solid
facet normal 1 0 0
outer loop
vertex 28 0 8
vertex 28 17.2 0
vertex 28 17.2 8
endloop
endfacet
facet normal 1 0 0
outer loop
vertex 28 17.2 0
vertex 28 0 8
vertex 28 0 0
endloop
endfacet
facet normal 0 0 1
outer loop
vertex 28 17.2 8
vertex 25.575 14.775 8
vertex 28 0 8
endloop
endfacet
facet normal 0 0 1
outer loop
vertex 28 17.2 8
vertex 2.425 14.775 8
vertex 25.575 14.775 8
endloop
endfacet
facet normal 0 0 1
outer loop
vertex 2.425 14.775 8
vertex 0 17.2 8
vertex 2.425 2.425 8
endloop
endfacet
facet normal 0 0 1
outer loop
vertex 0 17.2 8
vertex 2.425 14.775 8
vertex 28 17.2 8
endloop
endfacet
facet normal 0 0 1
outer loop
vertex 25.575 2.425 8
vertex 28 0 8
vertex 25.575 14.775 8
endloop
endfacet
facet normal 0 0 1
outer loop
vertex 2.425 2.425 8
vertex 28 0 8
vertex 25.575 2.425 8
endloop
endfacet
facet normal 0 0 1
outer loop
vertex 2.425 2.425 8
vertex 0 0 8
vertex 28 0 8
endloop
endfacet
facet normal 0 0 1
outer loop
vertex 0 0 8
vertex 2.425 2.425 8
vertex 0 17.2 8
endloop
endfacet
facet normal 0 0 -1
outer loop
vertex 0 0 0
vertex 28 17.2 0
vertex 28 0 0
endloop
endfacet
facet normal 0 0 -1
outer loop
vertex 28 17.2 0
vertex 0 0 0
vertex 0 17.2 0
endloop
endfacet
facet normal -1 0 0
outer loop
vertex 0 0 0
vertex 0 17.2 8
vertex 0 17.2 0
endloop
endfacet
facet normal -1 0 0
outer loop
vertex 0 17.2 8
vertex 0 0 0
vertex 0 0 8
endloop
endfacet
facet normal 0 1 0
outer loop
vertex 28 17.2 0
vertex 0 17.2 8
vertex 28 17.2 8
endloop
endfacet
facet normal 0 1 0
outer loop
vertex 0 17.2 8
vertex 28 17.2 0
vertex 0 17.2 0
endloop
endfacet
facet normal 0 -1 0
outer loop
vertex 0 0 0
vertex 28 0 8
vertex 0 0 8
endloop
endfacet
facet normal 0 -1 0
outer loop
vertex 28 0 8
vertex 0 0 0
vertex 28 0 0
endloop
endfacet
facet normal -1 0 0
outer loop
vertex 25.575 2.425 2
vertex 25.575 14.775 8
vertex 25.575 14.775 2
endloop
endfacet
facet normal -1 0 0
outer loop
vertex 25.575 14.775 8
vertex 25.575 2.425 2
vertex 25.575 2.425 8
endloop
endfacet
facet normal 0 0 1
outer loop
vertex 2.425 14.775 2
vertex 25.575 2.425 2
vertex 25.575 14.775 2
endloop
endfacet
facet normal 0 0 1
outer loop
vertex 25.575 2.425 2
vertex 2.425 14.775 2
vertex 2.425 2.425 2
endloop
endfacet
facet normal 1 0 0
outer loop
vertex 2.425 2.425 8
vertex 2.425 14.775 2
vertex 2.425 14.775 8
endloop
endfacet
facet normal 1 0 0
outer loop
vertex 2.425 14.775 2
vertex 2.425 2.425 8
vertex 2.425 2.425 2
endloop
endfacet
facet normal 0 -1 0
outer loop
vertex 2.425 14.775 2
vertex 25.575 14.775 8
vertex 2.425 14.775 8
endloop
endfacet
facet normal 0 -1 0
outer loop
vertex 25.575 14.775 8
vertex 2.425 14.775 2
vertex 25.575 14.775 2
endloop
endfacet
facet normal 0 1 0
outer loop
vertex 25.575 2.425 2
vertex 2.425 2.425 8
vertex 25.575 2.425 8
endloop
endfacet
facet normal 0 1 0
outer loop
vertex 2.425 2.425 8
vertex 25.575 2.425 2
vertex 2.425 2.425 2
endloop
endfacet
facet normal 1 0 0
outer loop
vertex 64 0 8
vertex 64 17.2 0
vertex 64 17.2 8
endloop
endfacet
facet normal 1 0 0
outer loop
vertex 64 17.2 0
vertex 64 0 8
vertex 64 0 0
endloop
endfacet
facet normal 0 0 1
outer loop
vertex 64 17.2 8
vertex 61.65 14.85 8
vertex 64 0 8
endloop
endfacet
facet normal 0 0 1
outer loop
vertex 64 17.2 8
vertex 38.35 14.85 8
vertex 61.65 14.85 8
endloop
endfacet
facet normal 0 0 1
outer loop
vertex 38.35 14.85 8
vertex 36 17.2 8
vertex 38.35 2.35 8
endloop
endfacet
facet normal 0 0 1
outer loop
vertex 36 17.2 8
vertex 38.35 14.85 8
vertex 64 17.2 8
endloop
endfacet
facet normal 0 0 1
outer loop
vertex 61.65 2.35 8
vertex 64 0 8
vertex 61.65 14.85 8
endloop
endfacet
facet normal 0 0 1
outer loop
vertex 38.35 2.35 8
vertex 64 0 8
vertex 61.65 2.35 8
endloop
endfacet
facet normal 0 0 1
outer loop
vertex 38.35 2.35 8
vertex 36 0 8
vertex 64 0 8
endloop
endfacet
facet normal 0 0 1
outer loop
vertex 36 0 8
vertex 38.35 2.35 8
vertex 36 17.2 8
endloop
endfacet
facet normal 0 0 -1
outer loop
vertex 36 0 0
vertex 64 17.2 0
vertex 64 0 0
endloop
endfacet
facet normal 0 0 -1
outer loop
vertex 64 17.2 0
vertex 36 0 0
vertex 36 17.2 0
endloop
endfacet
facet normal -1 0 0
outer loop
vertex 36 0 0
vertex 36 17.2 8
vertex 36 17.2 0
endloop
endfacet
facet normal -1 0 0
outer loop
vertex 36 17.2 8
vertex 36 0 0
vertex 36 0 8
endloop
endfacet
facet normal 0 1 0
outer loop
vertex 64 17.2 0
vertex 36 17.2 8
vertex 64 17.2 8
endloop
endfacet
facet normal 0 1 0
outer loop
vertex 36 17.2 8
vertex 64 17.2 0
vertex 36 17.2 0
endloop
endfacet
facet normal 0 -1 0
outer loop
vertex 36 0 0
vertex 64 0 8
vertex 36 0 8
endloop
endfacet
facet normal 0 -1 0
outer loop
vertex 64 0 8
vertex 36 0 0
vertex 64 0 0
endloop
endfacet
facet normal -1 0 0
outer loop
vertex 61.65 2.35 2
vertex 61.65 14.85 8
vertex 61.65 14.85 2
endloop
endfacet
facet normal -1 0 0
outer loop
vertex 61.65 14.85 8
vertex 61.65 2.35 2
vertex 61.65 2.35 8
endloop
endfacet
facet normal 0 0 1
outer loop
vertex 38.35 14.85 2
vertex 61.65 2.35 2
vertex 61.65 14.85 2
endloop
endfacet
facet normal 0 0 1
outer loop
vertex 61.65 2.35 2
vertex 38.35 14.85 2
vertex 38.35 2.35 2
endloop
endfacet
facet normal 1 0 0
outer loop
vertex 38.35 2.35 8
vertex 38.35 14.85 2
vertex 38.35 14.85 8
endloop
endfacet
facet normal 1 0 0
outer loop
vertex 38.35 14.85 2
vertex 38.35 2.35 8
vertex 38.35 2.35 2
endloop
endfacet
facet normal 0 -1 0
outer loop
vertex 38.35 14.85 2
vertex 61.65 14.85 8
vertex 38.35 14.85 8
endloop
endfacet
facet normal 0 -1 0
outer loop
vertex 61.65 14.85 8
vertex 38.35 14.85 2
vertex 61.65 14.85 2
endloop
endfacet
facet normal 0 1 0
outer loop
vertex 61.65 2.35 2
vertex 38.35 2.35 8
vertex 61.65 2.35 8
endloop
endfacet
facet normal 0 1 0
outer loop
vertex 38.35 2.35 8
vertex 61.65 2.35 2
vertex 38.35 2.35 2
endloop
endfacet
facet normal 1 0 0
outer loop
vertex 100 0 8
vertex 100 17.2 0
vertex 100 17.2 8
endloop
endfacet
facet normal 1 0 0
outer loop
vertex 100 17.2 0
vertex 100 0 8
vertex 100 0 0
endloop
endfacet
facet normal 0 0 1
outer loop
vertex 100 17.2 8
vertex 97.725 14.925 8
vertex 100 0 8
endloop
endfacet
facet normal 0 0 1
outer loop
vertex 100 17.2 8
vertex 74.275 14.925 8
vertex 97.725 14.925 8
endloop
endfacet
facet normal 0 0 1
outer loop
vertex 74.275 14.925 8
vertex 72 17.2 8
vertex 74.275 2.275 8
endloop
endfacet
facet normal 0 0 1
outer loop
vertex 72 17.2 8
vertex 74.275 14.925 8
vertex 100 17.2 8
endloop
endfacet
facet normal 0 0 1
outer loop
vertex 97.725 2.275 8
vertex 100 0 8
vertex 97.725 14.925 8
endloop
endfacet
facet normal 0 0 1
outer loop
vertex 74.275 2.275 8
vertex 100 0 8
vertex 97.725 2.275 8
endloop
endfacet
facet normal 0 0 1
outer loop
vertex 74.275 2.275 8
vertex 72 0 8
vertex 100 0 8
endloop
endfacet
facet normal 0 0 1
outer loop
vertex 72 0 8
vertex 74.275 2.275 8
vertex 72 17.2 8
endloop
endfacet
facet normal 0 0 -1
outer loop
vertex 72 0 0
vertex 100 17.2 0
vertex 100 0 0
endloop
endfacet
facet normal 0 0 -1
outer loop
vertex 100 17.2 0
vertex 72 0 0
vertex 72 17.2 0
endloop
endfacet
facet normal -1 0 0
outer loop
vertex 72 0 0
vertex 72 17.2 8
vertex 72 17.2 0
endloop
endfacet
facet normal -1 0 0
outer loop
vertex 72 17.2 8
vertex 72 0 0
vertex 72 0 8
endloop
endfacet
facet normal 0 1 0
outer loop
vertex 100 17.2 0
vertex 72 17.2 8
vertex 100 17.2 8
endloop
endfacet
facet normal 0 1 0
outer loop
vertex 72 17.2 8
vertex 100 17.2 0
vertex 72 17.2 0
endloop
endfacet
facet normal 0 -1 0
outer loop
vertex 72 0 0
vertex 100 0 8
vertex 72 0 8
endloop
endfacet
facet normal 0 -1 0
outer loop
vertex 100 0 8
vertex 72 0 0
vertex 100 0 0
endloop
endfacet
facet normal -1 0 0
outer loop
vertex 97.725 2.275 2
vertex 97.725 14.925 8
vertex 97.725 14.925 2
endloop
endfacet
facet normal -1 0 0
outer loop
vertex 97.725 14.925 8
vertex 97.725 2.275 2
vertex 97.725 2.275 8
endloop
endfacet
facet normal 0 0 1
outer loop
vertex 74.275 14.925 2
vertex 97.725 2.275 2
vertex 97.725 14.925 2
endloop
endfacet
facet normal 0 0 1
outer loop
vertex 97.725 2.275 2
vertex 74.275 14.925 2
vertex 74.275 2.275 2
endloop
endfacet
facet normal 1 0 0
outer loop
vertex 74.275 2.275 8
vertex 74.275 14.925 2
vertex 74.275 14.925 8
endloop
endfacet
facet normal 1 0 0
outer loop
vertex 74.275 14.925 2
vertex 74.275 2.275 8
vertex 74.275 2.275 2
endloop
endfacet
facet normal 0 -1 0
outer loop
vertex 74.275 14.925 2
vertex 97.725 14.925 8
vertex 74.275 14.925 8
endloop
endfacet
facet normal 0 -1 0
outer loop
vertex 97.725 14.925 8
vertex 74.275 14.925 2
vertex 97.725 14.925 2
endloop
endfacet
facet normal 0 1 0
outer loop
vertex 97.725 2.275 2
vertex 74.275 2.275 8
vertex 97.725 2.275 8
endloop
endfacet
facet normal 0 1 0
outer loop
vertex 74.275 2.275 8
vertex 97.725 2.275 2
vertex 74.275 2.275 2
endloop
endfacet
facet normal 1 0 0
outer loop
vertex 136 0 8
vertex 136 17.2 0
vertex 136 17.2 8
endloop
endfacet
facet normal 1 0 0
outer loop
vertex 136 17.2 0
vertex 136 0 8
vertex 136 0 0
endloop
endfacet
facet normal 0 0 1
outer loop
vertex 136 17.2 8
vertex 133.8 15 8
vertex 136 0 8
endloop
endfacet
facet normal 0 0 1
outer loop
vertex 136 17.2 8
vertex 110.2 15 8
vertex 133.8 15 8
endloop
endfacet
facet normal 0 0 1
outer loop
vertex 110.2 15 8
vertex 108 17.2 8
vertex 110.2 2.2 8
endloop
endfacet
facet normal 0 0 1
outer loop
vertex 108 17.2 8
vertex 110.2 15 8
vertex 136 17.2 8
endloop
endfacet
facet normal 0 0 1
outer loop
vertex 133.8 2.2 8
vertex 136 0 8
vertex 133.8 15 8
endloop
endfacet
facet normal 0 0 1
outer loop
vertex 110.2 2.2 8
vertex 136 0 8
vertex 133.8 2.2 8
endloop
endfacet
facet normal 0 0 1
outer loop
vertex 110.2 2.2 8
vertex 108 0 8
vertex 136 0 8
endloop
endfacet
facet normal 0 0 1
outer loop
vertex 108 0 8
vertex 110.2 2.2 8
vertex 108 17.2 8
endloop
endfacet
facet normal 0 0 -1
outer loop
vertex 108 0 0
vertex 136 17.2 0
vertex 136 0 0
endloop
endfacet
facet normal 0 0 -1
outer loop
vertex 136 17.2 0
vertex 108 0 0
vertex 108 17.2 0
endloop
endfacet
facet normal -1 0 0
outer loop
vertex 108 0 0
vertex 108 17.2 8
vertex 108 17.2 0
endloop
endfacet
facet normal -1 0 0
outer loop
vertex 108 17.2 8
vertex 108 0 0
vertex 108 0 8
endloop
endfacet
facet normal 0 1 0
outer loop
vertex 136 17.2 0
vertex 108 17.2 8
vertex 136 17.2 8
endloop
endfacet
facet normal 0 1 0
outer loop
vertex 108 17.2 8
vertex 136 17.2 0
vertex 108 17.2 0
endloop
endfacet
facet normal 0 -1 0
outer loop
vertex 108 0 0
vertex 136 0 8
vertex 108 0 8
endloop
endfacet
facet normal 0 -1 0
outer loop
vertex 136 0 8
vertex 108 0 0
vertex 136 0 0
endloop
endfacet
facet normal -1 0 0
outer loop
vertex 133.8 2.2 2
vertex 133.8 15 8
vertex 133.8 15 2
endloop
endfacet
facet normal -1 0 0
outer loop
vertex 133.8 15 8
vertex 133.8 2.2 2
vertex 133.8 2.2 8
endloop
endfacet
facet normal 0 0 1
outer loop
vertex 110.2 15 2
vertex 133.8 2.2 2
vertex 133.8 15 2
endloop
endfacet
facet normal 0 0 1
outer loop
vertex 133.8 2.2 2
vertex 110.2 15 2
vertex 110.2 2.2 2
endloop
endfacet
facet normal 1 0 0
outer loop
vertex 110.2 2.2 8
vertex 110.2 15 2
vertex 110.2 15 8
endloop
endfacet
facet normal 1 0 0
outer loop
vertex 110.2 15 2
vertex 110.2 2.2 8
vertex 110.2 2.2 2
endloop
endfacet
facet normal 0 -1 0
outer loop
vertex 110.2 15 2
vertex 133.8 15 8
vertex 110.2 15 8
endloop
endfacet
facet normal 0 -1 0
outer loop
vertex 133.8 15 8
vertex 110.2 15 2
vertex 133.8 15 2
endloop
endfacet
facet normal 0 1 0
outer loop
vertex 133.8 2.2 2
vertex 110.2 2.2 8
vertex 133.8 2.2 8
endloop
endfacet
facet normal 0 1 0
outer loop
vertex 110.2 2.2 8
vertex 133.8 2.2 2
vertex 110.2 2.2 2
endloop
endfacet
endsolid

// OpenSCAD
// One-robot MG90S servo pocket fit coupon for original Bluino SMARS gripper.
// Does not edit or redistribute the original gripper/forklift STLs.
// DEFAULT DIMENSIONS ARE NOMINAL ONLY. CALIPER-MEASURE YOUR ACTUAL MG90S.
$fn=32;
case_length_mm = 23.0;
case_width_mm = 12.2;
wall_mm = 2.5;
floor_mm = 2.0;
total_height_mm = 8.0;
spacing_mm = 8.0;
clearances_mm = [0.15, 0.30, 0.45, 0.60];
assert(case_length_mm > 0 && case_width_mm > 0, "Measure actual servo case first");
assert(wall_mm >= 2 && floor_mm >= 1.5 && total_height_mm > floor_mm);
module fit_gauge(clearance_mm) {
    length = case_length_mm + 2*wall_mm;
    width = case_width_mm + 2*wall_mm;
    difference() {
        cube([length, width, total_height_mm]);
        translate([wall_mm-clearance_mm/2,
                   wall_mm-clearance_mm/2, floor_mm])
            cube([case_length_mm+clearance_mm,
                  case_width_mm+clearance_mm,
                  total_height_mm-floor_mm+0.1]);
    }
}
for (i=[0:len(clearances_mm)-1]) {
    translate([i*(case_length_mm+2*wall_mm+spacing_mm),0,0])
        fit_gauge(clearances_mm[i]);
}
